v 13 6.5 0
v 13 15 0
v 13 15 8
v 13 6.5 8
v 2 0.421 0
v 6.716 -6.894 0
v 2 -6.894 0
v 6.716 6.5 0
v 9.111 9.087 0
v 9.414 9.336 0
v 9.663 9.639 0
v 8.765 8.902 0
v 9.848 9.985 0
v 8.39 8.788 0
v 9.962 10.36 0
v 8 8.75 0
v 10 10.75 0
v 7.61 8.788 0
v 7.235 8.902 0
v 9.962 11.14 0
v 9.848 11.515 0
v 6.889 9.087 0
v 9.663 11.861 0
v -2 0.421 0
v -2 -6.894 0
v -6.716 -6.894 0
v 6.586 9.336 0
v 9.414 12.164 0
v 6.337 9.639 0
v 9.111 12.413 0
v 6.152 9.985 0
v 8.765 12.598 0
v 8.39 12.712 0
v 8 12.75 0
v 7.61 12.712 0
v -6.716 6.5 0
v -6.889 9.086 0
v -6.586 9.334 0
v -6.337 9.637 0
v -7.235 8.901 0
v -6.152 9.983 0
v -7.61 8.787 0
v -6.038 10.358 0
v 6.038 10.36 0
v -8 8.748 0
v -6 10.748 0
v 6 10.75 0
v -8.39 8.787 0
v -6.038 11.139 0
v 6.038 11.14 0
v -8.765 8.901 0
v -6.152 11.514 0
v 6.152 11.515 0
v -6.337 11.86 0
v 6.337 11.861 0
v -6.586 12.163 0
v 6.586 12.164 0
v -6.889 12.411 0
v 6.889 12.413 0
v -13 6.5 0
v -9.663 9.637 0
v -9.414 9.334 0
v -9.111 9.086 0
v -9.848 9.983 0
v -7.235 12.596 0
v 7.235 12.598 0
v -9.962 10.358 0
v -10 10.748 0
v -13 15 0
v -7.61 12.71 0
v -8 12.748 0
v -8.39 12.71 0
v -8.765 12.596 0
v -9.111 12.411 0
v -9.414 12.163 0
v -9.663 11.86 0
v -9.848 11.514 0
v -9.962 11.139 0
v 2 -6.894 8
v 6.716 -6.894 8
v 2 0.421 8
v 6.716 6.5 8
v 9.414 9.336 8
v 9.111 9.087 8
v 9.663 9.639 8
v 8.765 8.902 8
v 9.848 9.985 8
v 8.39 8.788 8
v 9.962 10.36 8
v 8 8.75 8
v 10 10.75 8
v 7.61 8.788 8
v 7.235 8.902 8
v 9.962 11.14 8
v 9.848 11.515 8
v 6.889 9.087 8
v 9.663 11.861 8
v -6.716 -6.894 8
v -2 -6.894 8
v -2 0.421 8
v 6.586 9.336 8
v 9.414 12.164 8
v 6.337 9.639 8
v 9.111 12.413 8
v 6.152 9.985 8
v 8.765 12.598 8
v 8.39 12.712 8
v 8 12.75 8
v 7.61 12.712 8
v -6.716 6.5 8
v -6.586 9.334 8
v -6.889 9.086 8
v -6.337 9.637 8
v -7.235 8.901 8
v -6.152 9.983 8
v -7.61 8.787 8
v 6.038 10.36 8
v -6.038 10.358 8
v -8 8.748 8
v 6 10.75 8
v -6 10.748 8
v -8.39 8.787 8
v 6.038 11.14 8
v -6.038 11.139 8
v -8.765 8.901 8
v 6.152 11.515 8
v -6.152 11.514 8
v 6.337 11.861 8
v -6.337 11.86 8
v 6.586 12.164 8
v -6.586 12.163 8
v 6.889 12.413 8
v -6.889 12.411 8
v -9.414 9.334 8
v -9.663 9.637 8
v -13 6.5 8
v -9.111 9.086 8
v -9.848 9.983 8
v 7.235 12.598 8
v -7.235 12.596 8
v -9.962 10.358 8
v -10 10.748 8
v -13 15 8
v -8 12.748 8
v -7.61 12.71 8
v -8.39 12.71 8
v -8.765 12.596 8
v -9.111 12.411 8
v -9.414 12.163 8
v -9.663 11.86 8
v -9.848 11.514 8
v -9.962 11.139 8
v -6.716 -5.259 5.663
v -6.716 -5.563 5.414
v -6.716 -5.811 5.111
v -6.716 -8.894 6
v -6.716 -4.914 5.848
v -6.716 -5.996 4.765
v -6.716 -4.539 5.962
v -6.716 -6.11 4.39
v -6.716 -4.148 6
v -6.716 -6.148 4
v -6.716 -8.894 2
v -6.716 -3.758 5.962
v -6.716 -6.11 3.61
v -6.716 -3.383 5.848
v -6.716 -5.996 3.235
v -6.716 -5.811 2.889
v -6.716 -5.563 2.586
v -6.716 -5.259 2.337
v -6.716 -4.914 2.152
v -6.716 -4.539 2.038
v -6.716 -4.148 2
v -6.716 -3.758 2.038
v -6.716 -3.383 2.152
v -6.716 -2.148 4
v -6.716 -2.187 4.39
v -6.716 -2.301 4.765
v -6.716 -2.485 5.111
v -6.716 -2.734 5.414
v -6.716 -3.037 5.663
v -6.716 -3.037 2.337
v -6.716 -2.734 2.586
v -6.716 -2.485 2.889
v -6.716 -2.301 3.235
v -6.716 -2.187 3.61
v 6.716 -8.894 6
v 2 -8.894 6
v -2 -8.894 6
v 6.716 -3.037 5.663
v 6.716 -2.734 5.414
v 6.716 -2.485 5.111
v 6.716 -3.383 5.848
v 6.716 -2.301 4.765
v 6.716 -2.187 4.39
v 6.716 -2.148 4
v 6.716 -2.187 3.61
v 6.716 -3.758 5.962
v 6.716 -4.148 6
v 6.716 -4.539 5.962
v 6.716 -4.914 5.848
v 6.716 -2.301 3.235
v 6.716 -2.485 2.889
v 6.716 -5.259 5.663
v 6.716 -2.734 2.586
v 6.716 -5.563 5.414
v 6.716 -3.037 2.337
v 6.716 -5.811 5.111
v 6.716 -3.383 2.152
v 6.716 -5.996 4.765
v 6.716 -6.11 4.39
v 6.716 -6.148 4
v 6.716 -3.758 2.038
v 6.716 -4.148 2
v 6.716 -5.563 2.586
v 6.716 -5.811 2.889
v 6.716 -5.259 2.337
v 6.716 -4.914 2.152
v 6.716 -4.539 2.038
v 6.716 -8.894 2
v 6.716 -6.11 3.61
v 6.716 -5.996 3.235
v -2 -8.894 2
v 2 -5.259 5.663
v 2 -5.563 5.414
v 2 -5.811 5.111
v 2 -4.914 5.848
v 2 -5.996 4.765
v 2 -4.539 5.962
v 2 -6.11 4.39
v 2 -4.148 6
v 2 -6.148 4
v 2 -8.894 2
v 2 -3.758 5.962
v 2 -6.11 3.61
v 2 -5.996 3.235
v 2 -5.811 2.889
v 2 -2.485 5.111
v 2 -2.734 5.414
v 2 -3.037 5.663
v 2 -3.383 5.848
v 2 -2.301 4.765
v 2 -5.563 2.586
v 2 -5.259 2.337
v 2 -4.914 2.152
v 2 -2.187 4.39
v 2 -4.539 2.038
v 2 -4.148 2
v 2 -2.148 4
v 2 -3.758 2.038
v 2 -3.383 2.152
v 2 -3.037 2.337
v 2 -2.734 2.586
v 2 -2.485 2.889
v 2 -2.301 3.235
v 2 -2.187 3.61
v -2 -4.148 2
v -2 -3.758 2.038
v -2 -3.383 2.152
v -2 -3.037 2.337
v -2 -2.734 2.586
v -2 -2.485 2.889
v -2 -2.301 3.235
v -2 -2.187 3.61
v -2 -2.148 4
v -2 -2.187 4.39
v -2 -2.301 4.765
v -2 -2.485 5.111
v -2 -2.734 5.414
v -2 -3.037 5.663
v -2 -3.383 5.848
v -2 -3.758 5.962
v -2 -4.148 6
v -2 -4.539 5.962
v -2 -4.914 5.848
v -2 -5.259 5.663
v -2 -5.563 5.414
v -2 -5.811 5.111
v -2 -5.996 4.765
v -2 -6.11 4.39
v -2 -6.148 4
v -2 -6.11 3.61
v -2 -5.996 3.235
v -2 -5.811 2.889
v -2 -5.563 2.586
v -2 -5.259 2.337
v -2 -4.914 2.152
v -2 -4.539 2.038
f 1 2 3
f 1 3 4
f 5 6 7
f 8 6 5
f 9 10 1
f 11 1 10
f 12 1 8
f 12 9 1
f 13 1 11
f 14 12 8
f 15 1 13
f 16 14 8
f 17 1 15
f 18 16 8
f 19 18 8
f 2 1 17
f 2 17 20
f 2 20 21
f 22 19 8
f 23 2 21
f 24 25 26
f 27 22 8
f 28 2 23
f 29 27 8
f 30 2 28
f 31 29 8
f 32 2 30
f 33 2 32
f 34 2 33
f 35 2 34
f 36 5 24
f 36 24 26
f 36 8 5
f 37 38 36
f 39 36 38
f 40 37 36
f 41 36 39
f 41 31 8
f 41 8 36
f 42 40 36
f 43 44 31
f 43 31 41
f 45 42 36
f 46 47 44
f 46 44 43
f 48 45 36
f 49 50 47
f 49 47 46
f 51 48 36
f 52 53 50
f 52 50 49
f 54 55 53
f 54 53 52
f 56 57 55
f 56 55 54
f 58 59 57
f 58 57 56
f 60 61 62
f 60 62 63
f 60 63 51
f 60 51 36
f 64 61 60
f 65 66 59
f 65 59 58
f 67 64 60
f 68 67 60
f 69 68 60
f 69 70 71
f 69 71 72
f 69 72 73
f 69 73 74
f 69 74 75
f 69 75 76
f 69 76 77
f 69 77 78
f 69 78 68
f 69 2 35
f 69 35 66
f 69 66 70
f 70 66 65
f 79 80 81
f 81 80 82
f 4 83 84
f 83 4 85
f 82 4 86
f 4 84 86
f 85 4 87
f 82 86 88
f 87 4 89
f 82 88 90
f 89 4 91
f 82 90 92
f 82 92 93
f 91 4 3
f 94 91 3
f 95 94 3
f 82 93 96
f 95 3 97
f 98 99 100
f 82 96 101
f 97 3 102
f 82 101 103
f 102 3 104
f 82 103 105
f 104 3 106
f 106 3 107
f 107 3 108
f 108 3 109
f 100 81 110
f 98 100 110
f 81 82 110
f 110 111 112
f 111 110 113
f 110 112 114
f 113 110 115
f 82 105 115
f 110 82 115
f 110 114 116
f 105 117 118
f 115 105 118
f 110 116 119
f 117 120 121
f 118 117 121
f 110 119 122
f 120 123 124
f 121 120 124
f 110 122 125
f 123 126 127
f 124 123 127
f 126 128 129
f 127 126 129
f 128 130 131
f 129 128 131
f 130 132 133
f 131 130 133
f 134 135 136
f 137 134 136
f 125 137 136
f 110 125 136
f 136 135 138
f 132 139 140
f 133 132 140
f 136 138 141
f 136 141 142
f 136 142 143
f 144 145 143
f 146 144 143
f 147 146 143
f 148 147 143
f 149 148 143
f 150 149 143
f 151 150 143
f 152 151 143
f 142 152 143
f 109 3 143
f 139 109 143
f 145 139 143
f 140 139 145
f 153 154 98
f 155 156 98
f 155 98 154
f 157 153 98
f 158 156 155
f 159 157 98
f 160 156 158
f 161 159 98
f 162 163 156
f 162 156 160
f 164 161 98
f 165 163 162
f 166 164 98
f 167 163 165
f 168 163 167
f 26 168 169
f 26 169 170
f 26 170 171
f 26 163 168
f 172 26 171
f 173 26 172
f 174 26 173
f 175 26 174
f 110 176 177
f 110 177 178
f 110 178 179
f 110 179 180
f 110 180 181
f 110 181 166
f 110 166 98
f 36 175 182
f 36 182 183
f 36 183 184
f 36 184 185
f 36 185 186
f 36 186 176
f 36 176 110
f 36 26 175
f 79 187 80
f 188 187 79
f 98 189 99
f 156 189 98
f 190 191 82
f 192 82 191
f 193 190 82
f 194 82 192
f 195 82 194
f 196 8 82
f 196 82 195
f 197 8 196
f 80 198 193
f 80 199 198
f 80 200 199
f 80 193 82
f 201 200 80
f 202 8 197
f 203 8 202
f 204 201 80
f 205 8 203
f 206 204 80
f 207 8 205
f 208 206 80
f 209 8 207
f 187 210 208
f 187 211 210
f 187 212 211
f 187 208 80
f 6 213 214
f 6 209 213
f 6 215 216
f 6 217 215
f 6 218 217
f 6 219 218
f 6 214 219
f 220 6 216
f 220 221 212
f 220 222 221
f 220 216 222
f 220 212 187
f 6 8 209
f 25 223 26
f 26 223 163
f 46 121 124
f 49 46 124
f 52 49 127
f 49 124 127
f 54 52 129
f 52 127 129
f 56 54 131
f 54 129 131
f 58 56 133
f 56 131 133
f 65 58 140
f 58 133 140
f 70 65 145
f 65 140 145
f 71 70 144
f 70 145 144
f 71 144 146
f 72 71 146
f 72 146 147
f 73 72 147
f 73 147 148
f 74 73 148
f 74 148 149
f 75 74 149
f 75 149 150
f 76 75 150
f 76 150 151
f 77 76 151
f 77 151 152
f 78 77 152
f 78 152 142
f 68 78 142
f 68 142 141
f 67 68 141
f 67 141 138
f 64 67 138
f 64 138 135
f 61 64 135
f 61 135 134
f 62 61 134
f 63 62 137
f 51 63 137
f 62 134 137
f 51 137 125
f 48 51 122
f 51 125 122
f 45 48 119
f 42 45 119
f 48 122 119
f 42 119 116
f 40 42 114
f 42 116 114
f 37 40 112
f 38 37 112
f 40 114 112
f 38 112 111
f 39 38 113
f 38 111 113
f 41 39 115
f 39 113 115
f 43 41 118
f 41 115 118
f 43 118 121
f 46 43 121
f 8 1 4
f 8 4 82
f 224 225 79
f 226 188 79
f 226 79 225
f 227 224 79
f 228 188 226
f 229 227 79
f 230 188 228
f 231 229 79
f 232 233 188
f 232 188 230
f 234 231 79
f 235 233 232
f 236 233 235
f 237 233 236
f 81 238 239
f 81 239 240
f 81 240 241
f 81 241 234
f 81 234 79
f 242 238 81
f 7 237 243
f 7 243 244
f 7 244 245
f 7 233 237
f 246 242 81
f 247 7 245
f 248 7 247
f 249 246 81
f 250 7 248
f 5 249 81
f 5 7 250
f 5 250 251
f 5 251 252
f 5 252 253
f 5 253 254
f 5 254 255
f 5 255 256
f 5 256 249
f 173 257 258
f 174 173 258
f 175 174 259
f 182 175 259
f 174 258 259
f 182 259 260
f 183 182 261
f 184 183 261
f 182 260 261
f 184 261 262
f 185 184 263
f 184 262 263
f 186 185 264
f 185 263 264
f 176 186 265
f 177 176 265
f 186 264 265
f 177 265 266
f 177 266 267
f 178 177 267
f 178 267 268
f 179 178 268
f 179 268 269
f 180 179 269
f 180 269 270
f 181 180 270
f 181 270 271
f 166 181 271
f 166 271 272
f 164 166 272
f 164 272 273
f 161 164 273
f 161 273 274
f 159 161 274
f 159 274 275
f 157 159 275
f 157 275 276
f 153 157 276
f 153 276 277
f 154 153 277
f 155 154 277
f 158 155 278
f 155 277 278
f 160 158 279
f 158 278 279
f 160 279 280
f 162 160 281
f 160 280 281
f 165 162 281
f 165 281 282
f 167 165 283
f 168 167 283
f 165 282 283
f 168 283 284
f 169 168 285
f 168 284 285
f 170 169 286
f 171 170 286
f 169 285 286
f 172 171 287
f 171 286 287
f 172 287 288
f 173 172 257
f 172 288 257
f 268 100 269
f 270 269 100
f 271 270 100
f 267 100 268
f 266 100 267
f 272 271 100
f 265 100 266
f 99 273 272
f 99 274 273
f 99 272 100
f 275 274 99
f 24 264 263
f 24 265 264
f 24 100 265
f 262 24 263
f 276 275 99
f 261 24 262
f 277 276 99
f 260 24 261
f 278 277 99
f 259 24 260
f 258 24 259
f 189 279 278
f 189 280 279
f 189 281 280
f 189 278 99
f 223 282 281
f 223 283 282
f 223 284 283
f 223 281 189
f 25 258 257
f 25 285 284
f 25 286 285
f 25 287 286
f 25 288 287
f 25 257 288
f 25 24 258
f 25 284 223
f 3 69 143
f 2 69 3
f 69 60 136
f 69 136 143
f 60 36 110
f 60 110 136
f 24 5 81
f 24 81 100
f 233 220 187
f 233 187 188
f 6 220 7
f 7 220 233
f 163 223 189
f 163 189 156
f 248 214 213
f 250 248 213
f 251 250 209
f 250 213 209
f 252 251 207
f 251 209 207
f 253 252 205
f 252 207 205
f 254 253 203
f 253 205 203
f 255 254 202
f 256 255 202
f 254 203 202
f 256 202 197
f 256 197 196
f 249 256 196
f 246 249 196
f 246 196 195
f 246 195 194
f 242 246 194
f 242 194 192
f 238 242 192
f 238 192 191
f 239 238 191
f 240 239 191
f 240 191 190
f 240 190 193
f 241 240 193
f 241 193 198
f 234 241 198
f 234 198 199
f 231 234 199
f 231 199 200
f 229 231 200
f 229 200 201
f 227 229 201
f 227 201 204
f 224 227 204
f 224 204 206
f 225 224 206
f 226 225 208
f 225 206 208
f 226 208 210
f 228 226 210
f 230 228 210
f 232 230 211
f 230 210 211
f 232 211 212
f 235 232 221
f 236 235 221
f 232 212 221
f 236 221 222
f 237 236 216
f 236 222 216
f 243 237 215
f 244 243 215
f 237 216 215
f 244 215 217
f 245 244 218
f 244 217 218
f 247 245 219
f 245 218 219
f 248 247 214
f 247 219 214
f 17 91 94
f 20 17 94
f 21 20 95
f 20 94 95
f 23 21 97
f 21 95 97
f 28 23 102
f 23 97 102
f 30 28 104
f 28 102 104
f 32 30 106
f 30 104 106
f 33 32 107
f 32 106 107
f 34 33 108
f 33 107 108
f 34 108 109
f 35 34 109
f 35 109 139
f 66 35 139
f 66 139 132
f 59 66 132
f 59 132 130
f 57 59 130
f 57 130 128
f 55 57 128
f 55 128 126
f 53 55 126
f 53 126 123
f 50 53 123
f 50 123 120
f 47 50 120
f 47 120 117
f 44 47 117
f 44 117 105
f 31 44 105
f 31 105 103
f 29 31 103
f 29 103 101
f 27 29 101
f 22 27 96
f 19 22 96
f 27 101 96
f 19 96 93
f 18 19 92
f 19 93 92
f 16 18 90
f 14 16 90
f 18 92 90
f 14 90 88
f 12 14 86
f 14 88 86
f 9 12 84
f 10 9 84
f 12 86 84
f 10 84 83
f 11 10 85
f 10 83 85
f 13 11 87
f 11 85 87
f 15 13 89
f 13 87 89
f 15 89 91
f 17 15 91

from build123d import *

# Parameters (mm, degrees)
EXTRUDE_1_DEPTH     = 8
SKETCH_2_R          = 2
CUT_EXTRUDE_2_DEPTH = 22.400934559
SKETCH_3_R          = 2
CUT_EXTRUDE_1_DEPTH = 27.033270693
CHAMFER_1_SIZE      = 2


with BuildPart() as part:
    # Эскиз1 → Вытянуть1 (new body)
    with BuildSketch(Plane.XY):
        Polygon((-13, 15), (13, 15), (13, 6.500000002), (6.716266963, 6.500000002), (6.716266963, -8.894499905), (2, -8.894499905), (2, 0.42128884), (-2, 0.42128884), (-2, -8.894499905), (-6.716266963, -8.894499905), (-6.716266963, 6.500000002), (-13, 6.500000002), align=None)
    extrude(amount=EXTRUDE_1_DEPTH)

    # Эскиз2 → Вытянуть2 (cut, through all)
    with BuildSketch(Plane.XY.offset(8)):
        with Locations((-8, 10.748498226)):
            Circle(SKETCH_2_R)
        with Locations((8, 10.750000001)):
            Circle(SKETCH_2_R)
    extrude(amount=-CUT_EXTRUDE_2_DEPTH, mode=Mode.SUBTRACT)

    # Эскиз3 → Вырез-Вытянуть1 (cut, through all)
    with BuildSketch(Plane(origin=(6.716266963, 0, 0), x_dir=(0, 0, -1), z_dir=(1, 0, 0))):
        with Locations((-4, -4.14834478)):
            Circle(SKETCH_3_R)
    extrude(amount=-CUT_EXTRUDE_1_DEPTH, mode=Mode.SUBTRACT)

    # Фаска1
    chamfer_1_edges = [part.edges().sort_by_distance(p)[0] for p in [
        (4.358133481, -8.894499905, 0),
        (-4.358133481, -8.894499905, 0),
        (-4.358133481, -8.894499905, 8),
        (4.358133481, -8.894499905, 8),
    ]]
    chamfer(chamfer_1_edges, length=CHAMFER_1_SIZE)


solid = part.part
